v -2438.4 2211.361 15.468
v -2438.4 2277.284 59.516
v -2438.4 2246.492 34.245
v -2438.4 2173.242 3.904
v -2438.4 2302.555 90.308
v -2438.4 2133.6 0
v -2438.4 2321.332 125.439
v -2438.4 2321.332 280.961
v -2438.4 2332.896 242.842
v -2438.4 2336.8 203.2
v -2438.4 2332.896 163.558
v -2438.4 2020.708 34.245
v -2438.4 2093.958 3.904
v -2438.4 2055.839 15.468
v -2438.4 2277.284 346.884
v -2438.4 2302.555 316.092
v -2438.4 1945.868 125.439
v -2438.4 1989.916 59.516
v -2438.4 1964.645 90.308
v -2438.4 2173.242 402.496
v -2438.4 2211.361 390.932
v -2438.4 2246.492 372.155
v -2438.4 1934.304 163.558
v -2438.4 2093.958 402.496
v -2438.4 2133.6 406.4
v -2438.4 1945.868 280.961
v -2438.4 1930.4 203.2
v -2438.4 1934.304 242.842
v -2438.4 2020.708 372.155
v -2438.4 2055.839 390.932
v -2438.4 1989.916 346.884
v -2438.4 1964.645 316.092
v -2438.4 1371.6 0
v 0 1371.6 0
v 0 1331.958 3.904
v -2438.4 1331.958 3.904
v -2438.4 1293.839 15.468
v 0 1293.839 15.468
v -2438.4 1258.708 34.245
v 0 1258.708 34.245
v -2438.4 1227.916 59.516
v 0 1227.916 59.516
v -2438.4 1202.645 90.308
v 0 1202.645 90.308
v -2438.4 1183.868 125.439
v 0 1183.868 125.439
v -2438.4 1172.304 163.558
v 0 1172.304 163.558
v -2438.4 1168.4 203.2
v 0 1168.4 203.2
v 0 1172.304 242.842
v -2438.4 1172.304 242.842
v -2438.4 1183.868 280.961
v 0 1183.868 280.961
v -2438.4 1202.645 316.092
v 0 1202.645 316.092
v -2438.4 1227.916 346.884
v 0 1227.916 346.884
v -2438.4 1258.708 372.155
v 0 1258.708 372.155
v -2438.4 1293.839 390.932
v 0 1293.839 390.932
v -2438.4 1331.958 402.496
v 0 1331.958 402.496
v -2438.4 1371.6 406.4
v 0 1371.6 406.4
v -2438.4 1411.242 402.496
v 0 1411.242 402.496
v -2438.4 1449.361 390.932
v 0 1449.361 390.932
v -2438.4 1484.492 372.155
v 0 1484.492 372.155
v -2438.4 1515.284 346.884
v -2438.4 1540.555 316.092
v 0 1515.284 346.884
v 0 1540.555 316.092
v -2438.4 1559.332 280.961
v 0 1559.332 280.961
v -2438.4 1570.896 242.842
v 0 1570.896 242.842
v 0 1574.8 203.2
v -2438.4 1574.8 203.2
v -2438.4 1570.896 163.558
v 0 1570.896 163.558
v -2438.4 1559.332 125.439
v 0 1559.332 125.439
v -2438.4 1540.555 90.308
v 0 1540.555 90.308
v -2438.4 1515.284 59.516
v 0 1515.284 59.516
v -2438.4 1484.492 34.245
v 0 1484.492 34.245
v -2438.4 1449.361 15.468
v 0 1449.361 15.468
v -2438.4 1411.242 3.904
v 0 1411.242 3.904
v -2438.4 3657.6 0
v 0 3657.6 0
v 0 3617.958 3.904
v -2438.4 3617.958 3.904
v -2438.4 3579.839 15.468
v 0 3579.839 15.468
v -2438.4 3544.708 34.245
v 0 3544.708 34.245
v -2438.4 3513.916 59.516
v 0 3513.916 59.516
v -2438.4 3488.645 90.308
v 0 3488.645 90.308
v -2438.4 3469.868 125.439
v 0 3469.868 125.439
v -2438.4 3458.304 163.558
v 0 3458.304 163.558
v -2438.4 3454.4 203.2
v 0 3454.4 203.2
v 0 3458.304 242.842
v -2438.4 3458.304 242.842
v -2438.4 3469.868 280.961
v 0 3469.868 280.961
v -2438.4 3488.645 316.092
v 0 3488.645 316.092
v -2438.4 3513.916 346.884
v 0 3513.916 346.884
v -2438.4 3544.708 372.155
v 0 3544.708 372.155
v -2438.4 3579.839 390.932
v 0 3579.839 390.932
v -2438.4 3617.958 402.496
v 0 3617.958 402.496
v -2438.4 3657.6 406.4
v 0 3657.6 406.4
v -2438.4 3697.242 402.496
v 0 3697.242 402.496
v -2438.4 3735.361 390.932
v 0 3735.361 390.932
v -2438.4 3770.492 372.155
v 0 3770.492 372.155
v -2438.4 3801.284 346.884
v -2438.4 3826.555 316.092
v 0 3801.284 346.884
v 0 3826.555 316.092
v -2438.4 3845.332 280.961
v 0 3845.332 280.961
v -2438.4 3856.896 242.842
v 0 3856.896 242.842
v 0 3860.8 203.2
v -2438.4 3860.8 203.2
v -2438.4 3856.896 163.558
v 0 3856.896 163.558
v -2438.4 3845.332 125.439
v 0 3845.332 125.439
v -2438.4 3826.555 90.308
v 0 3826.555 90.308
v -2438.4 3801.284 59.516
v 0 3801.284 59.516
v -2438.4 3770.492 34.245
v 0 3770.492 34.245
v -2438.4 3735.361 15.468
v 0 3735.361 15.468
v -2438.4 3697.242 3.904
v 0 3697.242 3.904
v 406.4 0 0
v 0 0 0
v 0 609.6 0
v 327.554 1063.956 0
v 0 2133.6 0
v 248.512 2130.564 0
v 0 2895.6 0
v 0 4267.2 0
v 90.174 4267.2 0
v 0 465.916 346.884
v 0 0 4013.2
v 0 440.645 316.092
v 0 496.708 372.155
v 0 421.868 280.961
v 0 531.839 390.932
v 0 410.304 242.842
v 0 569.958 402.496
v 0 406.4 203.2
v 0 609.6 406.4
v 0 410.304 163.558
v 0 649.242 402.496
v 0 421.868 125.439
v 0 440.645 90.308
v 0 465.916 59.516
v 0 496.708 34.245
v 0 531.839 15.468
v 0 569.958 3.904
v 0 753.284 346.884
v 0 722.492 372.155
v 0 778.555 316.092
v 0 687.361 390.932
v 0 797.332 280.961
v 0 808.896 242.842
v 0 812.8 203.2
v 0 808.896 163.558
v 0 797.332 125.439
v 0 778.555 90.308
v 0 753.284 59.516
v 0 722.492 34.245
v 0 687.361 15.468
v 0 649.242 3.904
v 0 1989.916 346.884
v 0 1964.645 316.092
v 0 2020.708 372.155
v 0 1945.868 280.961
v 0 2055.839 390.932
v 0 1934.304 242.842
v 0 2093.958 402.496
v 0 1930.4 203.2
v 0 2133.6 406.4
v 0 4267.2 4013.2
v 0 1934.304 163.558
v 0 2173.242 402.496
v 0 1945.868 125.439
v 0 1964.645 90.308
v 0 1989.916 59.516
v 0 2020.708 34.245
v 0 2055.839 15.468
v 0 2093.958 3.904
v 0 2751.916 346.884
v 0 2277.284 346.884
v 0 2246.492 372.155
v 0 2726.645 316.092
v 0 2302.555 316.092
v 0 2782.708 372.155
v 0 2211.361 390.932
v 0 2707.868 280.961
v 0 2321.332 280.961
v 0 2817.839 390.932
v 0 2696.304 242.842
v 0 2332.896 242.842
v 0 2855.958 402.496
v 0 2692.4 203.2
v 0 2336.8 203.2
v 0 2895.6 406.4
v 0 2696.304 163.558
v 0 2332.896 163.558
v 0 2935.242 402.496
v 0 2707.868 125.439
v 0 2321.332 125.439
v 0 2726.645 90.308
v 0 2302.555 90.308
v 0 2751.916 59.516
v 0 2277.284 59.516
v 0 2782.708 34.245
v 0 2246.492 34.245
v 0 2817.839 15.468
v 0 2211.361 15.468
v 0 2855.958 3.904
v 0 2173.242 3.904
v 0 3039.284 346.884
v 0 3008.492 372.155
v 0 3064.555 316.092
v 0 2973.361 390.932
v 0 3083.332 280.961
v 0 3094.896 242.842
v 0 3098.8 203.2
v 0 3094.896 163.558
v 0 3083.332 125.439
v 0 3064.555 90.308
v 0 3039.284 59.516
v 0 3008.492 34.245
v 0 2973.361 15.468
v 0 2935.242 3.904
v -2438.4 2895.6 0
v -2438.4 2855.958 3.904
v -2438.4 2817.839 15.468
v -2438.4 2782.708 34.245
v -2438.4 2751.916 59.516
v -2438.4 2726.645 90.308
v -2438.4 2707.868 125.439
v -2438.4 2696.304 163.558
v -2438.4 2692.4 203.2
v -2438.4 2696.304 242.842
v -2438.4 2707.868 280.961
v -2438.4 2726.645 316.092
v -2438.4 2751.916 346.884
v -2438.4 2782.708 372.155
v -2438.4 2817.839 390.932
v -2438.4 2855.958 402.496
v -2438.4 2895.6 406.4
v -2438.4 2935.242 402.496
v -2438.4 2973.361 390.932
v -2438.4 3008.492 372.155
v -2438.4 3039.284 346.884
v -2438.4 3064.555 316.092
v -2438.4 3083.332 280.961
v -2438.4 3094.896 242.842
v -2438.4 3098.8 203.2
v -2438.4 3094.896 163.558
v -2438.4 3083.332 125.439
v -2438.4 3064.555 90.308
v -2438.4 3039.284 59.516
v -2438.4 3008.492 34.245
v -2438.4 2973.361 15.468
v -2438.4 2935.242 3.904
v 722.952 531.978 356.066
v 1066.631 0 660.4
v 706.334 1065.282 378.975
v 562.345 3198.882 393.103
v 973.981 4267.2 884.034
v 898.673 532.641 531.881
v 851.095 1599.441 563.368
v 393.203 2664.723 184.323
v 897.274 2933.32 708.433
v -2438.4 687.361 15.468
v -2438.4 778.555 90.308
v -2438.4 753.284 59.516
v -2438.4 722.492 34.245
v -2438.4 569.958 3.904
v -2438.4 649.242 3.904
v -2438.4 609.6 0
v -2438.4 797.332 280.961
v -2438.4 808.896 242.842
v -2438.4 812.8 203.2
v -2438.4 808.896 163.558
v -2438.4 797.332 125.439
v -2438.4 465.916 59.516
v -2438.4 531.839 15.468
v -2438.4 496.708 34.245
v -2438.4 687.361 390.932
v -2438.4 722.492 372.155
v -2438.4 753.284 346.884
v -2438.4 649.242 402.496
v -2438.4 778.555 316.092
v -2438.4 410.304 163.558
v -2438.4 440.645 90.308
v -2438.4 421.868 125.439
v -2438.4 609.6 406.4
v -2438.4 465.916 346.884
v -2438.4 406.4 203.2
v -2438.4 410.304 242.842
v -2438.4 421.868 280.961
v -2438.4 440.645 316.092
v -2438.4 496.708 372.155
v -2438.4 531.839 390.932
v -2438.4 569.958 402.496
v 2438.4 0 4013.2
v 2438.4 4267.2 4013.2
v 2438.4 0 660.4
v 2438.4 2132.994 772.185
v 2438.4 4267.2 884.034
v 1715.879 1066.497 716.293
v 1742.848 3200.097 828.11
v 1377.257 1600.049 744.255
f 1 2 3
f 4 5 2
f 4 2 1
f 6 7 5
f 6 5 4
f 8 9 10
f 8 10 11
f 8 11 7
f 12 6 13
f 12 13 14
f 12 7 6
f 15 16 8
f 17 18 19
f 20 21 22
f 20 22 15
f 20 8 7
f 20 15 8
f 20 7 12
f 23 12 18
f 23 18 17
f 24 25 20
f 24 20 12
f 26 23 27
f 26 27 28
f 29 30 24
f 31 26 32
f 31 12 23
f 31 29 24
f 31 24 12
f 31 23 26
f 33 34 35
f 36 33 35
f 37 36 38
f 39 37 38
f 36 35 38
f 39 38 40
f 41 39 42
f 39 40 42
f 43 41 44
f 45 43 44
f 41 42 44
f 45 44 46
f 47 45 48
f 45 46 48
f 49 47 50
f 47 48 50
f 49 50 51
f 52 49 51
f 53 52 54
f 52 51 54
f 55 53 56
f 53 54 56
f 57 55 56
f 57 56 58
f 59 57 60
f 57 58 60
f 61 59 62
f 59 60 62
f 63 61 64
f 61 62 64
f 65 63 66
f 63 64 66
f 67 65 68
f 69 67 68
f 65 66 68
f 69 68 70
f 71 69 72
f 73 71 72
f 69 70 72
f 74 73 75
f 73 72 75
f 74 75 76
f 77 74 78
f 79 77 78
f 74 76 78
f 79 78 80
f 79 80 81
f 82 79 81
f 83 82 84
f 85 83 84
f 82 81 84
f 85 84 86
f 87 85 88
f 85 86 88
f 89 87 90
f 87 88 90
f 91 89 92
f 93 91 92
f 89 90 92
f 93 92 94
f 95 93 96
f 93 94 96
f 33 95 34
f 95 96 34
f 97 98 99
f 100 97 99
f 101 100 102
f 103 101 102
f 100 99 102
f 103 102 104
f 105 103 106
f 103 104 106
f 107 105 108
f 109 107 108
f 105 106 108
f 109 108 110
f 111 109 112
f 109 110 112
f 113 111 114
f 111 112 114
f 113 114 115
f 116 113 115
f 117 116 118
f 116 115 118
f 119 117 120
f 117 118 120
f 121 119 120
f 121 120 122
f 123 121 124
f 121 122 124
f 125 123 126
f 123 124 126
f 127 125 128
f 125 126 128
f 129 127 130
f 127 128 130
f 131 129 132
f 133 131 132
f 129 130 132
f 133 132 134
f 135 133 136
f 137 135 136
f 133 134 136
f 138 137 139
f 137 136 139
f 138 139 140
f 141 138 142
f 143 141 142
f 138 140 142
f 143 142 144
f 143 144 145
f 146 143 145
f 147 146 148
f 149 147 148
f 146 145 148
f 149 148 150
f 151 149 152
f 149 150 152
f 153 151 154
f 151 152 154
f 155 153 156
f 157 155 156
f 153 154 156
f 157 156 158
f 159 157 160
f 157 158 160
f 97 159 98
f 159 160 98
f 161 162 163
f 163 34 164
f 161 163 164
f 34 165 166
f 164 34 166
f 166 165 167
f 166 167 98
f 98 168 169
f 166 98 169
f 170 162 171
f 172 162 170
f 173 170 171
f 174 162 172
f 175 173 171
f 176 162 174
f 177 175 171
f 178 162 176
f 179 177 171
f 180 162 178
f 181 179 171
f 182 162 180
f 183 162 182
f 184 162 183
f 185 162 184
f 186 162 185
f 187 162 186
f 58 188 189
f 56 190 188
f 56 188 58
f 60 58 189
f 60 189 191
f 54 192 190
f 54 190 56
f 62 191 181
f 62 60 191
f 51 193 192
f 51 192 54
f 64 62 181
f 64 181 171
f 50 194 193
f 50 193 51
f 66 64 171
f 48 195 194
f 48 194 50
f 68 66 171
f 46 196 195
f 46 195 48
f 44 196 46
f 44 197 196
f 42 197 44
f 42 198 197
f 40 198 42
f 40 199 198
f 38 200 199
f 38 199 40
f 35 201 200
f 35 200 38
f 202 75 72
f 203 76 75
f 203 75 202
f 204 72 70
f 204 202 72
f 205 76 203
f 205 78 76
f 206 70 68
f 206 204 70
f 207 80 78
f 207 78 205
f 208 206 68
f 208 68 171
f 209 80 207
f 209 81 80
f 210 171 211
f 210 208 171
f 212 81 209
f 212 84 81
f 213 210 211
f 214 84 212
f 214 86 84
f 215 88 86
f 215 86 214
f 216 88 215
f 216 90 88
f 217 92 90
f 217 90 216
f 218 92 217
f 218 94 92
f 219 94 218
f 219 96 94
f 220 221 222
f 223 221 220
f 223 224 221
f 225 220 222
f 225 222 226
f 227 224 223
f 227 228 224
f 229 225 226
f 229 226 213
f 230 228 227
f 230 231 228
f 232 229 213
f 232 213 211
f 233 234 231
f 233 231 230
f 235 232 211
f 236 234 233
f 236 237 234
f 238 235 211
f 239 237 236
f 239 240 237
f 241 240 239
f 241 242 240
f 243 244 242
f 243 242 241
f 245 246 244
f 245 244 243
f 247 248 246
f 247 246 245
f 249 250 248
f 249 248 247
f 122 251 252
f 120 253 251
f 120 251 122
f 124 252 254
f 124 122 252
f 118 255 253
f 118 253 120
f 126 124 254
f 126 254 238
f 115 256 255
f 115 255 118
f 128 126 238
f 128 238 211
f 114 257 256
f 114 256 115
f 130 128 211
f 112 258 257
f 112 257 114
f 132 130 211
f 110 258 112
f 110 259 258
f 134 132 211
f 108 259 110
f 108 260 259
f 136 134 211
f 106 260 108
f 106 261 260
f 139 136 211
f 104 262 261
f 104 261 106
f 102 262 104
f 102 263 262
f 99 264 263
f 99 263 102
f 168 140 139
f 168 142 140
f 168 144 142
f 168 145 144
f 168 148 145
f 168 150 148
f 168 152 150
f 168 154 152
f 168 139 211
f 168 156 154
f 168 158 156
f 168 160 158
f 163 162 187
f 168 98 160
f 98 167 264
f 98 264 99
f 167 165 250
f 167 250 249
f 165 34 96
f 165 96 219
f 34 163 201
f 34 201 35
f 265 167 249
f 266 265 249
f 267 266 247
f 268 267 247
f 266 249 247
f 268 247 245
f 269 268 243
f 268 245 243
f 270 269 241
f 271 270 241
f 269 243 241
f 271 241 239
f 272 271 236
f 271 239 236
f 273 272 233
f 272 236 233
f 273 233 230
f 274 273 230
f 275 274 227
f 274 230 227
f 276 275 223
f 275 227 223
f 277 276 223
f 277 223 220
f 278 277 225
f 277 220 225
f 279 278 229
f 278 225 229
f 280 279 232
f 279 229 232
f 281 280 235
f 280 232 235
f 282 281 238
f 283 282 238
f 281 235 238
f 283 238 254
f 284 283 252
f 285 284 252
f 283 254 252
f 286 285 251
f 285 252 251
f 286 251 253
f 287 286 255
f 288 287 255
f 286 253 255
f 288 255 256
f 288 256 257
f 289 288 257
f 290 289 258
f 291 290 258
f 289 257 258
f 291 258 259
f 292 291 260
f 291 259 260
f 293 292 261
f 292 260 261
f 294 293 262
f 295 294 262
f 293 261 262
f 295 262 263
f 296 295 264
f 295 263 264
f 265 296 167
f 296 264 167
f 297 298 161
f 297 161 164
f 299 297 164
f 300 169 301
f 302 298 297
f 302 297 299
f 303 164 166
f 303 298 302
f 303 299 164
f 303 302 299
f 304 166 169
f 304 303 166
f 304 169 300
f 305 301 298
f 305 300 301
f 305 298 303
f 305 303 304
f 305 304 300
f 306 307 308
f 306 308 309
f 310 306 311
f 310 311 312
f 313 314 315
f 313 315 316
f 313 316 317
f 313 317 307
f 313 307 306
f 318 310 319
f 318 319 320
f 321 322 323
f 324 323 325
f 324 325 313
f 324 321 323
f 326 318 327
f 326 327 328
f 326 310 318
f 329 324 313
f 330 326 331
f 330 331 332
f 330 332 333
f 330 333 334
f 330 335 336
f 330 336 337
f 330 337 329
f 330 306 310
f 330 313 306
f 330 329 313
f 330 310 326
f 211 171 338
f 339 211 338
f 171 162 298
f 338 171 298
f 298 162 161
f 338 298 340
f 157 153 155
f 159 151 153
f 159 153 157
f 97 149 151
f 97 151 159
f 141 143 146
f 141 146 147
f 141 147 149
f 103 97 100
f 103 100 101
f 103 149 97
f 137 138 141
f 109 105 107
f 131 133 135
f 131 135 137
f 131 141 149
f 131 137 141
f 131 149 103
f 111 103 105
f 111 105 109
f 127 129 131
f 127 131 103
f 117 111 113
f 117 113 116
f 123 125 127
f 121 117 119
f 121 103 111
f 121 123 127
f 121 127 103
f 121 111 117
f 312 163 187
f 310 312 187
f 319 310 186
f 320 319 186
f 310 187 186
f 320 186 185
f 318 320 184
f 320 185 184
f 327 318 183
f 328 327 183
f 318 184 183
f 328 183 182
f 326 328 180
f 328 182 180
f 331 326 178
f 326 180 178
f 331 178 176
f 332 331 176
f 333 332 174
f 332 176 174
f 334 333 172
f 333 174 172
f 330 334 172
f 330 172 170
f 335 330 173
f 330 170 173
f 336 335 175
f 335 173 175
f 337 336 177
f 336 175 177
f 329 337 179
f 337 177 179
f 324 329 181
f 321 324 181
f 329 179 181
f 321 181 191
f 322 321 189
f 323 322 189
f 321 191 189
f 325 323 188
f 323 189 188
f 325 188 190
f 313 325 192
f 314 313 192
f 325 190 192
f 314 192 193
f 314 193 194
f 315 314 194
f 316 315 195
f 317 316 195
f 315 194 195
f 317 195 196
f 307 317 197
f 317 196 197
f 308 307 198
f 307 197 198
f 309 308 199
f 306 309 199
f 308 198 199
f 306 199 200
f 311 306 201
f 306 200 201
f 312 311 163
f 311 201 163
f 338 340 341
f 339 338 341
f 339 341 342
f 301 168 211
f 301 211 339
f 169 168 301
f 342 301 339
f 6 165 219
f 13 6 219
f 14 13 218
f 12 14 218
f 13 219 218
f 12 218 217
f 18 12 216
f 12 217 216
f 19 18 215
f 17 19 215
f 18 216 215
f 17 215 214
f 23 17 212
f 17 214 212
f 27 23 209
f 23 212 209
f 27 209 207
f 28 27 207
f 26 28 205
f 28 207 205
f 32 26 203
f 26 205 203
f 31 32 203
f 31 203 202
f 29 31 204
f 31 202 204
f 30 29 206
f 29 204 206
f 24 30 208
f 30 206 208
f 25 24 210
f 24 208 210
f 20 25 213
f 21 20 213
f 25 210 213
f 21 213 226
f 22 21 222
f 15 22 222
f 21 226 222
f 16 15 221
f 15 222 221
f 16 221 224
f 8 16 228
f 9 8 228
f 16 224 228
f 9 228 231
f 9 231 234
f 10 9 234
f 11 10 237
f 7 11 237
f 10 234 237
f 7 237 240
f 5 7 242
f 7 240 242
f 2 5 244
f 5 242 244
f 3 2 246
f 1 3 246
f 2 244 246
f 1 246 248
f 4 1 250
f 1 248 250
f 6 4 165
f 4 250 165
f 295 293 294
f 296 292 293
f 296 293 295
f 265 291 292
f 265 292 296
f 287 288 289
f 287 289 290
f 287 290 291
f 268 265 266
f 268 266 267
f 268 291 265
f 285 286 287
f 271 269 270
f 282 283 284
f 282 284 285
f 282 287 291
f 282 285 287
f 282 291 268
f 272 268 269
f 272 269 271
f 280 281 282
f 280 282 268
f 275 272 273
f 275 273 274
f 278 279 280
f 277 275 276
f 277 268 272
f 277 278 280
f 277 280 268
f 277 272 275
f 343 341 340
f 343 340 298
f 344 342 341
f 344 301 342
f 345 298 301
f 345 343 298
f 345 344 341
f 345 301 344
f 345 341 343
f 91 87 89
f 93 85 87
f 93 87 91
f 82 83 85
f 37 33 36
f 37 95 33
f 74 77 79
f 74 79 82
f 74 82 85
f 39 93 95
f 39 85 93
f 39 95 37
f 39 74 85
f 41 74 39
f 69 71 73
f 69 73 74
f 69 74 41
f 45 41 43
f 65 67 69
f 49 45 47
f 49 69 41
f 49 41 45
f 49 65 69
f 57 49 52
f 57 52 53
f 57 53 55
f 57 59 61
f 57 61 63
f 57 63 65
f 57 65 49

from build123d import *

# Parameters (mm, degrees)
F0_W     = 2438.4
F0_H     = 4267.2
F1_DEPTH = 4013.2
F3_DEPTH = 4267.2
F3_TAPER = -3
F5_DEPTH = 2438.4


with BuildPart() as f1:
    # F0 (on Top) → F1 (new body)
    with BuildSketch(Plane.XY):
        with Locations((1219.2, 2133.6)):
            Rectangle(F0_W, F0_H)
    extrude(amount=F1_DEPTH)

    # F2 (on face) → F3 (cut)
    with BuildSketch(Plane.XZ):
        Polygon((406.4, 0), (2438.4, 0), (2438.4, 660.4), (1066.6307210922, 660.4), align=None)
    extrude(amount=-F3_DEPTH, taper=F3_TAPER, mode=Mode.SUBTRACT)

    # F4 (on face) → F5 (join)
    with BuildSketch(Plane(origin=(0, 0, 0), x_dir=(0, -1, 0), z_dir=(-1, 0, 0))):
        with BuildLine():
            ThreePointArc((-2692.4, 203.2), (-3039.2840979371, 346.8840979371), (-2895.6, 0))
            ThreePointArc((-2895.6, 0), (-2751.9159020629, 59.5159020629), (-2692.4, 203.2))
        make_face()
        with BuildLine():
            ThreePointArc((-1930.4, 203.2), (-2277.2840979371, 346.8840979371), (-2133.6, 0))
            ThreePointArc((-2133.6, 0), (-1989.9159020629, 59.5159020629), (-1930.4, 203.2))
        make_face()
        with BuildLine():
            ThreePointArc((-1168.4, 203.2), (-1515.2840979371, 346.8840979371), (-1371.6, 0))
            ThreePointArc((-1371.6, 0), (-1227.9159020629, 59.5159020629), (-1168.4, 203.2))
        make_face()
        with BuildLine():
            ThreePointArc((-406.4, 203.2), (-753.2840979371, 346.8840979371), (-609.6, 0))
            ThreePointArc((-609.6, 0), (-465.9159020629, 59.5159020629), (-406.4, 203.2))
        make_face()
        with BuildLine():
            ThreePointArc((-3454.4, 203.2), (-3801.2840979371, 346.8840979371), (-3657.6, 0))
            ThreePointArc((-3657.6, 0), (-3513.9159020629, 59.5159020629), (-3454.4, 203.2))
        make_face()
    extrude(amount=F5_DEPTH)


solid = f1.part
